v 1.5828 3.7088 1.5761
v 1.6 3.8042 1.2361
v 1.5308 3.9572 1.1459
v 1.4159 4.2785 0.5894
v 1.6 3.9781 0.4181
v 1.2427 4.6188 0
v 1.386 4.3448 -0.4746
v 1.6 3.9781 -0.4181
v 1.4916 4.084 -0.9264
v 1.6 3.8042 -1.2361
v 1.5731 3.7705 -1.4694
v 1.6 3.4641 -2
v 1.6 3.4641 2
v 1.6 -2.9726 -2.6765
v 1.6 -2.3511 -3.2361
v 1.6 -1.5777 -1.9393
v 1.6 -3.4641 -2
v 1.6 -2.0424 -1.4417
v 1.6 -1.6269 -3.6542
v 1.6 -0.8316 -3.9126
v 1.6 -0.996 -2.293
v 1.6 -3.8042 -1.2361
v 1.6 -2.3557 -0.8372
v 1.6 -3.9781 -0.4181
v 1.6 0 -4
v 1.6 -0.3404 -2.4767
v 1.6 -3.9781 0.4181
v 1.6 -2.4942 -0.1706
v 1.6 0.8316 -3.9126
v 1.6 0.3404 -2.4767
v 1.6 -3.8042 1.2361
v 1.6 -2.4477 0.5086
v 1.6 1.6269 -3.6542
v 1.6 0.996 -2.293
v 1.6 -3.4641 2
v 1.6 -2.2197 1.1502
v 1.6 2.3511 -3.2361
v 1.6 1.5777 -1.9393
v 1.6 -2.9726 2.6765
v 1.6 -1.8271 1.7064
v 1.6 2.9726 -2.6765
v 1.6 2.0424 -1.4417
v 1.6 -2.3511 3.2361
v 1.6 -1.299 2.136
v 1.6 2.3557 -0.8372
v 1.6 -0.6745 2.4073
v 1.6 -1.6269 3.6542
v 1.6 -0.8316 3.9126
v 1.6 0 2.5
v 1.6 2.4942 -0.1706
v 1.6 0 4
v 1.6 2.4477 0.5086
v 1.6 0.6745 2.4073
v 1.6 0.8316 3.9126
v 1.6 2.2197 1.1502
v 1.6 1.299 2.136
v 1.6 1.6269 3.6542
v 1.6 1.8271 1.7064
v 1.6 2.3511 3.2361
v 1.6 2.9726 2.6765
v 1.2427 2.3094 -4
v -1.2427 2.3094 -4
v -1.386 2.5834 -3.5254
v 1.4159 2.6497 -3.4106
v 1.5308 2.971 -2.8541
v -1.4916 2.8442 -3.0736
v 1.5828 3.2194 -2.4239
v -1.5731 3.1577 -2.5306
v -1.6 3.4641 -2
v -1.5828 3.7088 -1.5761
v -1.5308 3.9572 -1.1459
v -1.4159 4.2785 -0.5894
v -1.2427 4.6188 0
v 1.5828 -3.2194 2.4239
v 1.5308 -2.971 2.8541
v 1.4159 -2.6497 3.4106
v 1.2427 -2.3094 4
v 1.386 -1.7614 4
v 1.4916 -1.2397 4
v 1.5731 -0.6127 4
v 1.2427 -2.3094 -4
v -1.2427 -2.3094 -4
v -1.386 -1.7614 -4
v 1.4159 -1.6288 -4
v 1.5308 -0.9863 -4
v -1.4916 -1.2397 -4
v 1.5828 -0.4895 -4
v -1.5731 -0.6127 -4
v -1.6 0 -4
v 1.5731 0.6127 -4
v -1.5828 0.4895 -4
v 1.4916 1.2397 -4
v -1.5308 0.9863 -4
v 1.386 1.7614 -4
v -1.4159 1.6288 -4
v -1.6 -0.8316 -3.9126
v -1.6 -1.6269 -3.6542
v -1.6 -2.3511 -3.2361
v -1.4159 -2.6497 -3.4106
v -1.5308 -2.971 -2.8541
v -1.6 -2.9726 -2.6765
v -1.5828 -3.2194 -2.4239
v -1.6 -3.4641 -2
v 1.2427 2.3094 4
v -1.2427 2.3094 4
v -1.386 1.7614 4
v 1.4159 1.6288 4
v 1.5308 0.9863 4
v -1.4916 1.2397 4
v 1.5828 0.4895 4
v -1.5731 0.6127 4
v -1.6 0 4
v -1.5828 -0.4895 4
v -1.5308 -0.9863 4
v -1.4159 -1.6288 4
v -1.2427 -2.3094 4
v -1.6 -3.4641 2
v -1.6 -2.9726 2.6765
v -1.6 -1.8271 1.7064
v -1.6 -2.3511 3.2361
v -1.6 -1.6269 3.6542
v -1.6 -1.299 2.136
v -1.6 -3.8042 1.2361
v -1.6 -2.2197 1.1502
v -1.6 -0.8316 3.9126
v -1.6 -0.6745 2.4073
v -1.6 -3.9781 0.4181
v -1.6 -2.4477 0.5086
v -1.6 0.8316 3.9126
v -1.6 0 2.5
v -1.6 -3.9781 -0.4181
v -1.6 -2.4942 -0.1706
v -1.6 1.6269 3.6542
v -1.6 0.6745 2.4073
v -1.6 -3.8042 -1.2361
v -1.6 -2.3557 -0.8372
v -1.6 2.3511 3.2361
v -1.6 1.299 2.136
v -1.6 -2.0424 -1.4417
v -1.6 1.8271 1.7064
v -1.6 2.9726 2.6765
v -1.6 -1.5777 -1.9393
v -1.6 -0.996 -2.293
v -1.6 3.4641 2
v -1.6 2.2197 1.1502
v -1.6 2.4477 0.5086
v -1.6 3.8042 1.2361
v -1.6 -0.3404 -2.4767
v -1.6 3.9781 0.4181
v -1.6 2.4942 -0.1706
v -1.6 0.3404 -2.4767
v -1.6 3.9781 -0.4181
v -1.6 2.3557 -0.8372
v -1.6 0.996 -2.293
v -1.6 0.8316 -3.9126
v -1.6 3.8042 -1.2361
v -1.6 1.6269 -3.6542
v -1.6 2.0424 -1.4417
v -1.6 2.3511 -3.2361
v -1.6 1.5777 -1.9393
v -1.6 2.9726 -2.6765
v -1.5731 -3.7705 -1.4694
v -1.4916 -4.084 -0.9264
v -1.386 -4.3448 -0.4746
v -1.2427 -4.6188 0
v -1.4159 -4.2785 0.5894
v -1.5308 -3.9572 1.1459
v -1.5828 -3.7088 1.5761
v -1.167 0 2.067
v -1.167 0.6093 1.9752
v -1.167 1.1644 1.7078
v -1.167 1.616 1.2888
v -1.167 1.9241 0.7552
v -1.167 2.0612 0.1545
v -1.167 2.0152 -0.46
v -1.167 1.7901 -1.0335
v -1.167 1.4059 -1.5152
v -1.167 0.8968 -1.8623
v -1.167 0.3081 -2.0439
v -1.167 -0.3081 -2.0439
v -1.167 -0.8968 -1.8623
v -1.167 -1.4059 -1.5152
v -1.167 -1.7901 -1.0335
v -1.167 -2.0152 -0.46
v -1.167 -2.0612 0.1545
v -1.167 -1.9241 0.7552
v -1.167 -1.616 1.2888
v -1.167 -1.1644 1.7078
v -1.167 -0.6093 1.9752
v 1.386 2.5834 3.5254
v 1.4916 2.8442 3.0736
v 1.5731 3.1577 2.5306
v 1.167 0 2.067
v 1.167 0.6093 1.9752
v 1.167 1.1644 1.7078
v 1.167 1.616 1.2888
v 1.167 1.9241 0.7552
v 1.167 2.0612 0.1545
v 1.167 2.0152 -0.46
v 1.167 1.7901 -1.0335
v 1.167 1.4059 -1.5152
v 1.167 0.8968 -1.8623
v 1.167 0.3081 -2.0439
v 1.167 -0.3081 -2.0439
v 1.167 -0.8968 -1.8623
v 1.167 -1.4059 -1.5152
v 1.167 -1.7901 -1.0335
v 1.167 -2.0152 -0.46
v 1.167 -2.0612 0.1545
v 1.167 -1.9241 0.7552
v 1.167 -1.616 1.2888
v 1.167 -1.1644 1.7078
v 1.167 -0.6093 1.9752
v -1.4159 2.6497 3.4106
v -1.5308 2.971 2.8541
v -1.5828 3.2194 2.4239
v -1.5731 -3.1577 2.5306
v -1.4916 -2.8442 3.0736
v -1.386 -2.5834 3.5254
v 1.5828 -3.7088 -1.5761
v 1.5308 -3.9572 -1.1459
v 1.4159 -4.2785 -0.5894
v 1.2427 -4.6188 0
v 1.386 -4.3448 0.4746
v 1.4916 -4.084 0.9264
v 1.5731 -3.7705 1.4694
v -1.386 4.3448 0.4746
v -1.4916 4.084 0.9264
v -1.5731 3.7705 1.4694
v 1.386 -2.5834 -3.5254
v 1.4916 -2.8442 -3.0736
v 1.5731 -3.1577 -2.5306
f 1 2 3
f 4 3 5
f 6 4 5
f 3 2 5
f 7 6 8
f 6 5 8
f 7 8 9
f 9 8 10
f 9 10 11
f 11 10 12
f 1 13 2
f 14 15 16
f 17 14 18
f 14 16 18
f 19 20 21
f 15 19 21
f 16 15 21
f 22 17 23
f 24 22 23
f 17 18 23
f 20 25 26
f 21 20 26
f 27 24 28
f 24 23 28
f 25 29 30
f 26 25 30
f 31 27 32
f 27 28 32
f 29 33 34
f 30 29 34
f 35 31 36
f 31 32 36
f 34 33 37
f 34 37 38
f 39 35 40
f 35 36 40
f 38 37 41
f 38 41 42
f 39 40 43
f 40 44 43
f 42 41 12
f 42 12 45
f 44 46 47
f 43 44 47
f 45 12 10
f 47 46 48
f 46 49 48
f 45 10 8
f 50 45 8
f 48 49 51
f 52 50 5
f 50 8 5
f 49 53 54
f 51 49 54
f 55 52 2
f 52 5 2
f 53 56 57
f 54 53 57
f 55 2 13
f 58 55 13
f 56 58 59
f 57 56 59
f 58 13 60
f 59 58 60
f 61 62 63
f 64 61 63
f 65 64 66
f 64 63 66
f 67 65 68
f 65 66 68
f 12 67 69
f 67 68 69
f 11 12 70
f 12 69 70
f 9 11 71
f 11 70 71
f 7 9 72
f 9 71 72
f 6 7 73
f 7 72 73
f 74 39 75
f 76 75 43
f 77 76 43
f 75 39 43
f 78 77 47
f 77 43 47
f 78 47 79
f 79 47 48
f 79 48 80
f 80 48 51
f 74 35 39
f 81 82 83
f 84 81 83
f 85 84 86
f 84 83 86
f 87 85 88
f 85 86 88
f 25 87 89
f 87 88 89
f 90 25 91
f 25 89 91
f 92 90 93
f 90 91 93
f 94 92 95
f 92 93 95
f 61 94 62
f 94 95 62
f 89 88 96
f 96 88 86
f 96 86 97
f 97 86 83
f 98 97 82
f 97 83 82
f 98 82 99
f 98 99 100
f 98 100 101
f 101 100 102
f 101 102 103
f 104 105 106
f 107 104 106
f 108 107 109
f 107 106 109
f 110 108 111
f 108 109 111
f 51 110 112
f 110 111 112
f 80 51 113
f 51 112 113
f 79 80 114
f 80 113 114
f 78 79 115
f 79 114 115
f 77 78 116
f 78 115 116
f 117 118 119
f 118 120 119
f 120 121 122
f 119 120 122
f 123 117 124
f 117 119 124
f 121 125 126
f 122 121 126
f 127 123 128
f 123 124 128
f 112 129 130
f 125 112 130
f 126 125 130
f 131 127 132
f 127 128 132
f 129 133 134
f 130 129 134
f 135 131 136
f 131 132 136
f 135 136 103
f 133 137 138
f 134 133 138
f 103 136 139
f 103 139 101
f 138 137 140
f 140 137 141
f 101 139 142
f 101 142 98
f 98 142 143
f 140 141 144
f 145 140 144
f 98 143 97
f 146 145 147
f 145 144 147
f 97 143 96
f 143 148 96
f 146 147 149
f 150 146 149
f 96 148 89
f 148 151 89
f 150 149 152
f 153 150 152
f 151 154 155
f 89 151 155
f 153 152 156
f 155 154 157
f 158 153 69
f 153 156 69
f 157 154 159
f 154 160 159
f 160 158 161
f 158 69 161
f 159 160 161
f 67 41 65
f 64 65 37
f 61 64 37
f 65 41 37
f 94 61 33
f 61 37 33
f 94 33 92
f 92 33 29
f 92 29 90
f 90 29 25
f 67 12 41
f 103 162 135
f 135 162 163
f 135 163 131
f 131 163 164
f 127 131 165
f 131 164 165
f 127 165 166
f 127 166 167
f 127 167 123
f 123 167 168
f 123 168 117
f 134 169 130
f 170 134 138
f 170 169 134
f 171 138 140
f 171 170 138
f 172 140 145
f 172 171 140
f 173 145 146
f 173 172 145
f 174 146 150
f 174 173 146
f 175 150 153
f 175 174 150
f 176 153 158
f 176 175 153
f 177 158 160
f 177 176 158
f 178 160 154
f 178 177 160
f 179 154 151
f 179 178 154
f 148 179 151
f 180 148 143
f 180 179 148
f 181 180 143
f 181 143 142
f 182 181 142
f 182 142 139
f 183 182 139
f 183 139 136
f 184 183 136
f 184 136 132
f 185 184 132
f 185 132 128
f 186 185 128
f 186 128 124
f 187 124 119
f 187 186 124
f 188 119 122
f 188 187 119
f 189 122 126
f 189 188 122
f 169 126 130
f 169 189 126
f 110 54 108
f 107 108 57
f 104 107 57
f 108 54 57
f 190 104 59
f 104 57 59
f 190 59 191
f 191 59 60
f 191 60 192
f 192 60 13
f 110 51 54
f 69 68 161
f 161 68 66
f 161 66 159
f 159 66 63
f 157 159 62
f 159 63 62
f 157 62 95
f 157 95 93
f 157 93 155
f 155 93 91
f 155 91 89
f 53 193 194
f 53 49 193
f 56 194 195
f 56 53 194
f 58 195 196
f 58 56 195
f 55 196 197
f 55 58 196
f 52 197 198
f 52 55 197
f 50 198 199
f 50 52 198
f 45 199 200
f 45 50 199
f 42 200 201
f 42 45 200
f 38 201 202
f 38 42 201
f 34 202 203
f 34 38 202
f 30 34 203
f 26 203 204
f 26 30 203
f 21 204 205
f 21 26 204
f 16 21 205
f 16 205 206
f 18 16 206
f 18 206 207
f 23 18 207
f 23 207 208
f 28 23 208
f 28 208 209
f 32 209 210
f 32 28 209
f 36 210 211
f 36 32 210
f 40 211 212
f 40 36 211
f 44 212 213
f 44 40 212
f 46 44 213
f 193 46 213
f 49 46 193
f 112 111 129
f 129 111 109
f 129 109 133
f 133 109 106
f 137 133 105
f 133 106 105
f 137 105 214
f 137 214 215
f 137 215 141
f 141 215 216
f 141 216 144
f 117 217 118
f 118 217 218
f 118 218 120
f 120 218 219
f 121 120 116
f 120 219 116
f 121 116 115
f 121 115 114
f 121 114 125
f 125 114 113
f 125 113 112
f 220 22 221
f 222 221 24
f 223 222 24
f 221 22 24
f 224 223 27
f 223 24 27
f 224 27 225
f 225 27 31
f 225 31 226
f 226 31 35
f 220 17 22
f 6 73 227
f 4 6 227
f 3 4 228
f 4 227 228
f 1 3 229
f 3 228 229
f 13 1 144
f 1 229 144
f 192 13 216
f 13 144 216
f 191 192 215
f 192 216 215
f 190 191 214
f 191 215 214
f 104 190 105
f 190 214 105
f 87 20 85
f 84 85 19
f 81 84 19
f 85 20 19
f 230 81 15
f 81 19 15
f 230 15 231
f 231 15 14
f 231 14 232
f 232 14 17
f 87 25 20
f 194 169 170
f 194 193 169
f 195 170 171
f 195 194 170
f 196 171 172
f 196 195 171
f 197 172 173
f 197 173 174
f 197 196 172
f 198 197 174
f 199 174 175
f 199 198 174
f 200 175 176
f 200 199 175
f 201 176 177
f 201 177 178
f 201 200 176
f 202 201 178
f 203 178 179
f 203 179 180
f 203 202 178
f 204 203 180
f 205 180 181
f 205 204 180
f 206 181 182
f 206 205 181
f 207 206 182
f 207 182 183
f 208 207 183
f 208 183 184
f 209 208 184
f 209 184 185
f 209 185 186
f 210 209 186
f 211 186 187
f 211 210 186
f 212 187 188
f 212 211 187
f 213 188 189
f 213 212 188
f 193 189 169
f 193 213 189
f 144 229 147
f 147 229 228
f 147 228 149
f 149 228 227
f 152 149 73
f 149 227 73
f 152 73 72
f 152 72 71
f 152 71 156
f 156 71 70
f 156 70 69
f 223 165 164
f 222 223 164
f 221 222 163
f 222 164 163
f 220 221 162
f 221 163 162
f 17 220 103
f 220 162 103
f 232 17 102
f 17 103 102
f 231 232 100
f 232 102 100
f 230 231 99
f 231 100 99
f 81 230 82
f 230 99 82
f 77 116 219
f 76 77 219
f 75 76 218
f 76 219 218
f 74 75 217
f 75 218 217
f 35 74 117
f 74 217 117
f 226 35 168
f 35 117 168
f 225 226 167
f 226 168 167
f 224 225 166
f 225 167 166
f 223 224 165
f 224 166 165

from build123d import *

# Parameters (mm, degrees)
CUT_EXTRUDE_1_DEPTH      = 3.2
CUT_EXTRUDE_1_DEPTH_BACK = 3.2
SKETCH_2_W               = 18.4
SKETCH_2_H               = 18.4


with BuildPart() as part:
    # 草图1 → 旋转1 (revolve)
    with BuildSketch(Plane.XY):
        Polygon((-1.6, 0), (-1.6, 4), (-1.138119785, 4.8), (1.138119785, 4.8), (1.6, 4), (1.6, 0), align=None)
    revolve(axis=Axis((1.6, 0, 0), (-1, 0, 0)))

    # 草图2 → 切除-拉伸1 (cut, two sides: drawn at the far end of the back side and taken through both)
    with BuildSketch(Plane(origin=(0, 0, 0), x_dir=(0, 0, -1), z_dir=(1, 0, 0)).offset(-CUT_EXTRUDE_1_DEPTH_BACK)):
        Rectangle(SKETCH_2_W, SKETCH_2_H)
        Polygon((-4, 2.309401077), (-4, -2.309401077), (0, -4.618802154), (4, -2.309401077), (4, 2.309401077), (0, 4.618802154), align=None, mode=Mode.SUBTRACT)
    extrude(amount=CUT_EXTRUDE_1_DEPTH + CUT_EXTRUDE_1_DEPTH_BACK, mode=Mode.SUBTRACT)

    # 草图3 → 切除-旋转1 (revolve, cut)
    with BuildSketch(Plane.XY):
        Polygon((-1.6, 0), (-1.6, 2.5), (-1.167, 2.067), (1.167, 2.067), (1.6, 2.5), (1.6, 0), align=None)
    revolve(axis=Axis((1.6, 0, 0), (-1, 0, 0)), mode=Mode.SUBTRACT)


solid = part.part
